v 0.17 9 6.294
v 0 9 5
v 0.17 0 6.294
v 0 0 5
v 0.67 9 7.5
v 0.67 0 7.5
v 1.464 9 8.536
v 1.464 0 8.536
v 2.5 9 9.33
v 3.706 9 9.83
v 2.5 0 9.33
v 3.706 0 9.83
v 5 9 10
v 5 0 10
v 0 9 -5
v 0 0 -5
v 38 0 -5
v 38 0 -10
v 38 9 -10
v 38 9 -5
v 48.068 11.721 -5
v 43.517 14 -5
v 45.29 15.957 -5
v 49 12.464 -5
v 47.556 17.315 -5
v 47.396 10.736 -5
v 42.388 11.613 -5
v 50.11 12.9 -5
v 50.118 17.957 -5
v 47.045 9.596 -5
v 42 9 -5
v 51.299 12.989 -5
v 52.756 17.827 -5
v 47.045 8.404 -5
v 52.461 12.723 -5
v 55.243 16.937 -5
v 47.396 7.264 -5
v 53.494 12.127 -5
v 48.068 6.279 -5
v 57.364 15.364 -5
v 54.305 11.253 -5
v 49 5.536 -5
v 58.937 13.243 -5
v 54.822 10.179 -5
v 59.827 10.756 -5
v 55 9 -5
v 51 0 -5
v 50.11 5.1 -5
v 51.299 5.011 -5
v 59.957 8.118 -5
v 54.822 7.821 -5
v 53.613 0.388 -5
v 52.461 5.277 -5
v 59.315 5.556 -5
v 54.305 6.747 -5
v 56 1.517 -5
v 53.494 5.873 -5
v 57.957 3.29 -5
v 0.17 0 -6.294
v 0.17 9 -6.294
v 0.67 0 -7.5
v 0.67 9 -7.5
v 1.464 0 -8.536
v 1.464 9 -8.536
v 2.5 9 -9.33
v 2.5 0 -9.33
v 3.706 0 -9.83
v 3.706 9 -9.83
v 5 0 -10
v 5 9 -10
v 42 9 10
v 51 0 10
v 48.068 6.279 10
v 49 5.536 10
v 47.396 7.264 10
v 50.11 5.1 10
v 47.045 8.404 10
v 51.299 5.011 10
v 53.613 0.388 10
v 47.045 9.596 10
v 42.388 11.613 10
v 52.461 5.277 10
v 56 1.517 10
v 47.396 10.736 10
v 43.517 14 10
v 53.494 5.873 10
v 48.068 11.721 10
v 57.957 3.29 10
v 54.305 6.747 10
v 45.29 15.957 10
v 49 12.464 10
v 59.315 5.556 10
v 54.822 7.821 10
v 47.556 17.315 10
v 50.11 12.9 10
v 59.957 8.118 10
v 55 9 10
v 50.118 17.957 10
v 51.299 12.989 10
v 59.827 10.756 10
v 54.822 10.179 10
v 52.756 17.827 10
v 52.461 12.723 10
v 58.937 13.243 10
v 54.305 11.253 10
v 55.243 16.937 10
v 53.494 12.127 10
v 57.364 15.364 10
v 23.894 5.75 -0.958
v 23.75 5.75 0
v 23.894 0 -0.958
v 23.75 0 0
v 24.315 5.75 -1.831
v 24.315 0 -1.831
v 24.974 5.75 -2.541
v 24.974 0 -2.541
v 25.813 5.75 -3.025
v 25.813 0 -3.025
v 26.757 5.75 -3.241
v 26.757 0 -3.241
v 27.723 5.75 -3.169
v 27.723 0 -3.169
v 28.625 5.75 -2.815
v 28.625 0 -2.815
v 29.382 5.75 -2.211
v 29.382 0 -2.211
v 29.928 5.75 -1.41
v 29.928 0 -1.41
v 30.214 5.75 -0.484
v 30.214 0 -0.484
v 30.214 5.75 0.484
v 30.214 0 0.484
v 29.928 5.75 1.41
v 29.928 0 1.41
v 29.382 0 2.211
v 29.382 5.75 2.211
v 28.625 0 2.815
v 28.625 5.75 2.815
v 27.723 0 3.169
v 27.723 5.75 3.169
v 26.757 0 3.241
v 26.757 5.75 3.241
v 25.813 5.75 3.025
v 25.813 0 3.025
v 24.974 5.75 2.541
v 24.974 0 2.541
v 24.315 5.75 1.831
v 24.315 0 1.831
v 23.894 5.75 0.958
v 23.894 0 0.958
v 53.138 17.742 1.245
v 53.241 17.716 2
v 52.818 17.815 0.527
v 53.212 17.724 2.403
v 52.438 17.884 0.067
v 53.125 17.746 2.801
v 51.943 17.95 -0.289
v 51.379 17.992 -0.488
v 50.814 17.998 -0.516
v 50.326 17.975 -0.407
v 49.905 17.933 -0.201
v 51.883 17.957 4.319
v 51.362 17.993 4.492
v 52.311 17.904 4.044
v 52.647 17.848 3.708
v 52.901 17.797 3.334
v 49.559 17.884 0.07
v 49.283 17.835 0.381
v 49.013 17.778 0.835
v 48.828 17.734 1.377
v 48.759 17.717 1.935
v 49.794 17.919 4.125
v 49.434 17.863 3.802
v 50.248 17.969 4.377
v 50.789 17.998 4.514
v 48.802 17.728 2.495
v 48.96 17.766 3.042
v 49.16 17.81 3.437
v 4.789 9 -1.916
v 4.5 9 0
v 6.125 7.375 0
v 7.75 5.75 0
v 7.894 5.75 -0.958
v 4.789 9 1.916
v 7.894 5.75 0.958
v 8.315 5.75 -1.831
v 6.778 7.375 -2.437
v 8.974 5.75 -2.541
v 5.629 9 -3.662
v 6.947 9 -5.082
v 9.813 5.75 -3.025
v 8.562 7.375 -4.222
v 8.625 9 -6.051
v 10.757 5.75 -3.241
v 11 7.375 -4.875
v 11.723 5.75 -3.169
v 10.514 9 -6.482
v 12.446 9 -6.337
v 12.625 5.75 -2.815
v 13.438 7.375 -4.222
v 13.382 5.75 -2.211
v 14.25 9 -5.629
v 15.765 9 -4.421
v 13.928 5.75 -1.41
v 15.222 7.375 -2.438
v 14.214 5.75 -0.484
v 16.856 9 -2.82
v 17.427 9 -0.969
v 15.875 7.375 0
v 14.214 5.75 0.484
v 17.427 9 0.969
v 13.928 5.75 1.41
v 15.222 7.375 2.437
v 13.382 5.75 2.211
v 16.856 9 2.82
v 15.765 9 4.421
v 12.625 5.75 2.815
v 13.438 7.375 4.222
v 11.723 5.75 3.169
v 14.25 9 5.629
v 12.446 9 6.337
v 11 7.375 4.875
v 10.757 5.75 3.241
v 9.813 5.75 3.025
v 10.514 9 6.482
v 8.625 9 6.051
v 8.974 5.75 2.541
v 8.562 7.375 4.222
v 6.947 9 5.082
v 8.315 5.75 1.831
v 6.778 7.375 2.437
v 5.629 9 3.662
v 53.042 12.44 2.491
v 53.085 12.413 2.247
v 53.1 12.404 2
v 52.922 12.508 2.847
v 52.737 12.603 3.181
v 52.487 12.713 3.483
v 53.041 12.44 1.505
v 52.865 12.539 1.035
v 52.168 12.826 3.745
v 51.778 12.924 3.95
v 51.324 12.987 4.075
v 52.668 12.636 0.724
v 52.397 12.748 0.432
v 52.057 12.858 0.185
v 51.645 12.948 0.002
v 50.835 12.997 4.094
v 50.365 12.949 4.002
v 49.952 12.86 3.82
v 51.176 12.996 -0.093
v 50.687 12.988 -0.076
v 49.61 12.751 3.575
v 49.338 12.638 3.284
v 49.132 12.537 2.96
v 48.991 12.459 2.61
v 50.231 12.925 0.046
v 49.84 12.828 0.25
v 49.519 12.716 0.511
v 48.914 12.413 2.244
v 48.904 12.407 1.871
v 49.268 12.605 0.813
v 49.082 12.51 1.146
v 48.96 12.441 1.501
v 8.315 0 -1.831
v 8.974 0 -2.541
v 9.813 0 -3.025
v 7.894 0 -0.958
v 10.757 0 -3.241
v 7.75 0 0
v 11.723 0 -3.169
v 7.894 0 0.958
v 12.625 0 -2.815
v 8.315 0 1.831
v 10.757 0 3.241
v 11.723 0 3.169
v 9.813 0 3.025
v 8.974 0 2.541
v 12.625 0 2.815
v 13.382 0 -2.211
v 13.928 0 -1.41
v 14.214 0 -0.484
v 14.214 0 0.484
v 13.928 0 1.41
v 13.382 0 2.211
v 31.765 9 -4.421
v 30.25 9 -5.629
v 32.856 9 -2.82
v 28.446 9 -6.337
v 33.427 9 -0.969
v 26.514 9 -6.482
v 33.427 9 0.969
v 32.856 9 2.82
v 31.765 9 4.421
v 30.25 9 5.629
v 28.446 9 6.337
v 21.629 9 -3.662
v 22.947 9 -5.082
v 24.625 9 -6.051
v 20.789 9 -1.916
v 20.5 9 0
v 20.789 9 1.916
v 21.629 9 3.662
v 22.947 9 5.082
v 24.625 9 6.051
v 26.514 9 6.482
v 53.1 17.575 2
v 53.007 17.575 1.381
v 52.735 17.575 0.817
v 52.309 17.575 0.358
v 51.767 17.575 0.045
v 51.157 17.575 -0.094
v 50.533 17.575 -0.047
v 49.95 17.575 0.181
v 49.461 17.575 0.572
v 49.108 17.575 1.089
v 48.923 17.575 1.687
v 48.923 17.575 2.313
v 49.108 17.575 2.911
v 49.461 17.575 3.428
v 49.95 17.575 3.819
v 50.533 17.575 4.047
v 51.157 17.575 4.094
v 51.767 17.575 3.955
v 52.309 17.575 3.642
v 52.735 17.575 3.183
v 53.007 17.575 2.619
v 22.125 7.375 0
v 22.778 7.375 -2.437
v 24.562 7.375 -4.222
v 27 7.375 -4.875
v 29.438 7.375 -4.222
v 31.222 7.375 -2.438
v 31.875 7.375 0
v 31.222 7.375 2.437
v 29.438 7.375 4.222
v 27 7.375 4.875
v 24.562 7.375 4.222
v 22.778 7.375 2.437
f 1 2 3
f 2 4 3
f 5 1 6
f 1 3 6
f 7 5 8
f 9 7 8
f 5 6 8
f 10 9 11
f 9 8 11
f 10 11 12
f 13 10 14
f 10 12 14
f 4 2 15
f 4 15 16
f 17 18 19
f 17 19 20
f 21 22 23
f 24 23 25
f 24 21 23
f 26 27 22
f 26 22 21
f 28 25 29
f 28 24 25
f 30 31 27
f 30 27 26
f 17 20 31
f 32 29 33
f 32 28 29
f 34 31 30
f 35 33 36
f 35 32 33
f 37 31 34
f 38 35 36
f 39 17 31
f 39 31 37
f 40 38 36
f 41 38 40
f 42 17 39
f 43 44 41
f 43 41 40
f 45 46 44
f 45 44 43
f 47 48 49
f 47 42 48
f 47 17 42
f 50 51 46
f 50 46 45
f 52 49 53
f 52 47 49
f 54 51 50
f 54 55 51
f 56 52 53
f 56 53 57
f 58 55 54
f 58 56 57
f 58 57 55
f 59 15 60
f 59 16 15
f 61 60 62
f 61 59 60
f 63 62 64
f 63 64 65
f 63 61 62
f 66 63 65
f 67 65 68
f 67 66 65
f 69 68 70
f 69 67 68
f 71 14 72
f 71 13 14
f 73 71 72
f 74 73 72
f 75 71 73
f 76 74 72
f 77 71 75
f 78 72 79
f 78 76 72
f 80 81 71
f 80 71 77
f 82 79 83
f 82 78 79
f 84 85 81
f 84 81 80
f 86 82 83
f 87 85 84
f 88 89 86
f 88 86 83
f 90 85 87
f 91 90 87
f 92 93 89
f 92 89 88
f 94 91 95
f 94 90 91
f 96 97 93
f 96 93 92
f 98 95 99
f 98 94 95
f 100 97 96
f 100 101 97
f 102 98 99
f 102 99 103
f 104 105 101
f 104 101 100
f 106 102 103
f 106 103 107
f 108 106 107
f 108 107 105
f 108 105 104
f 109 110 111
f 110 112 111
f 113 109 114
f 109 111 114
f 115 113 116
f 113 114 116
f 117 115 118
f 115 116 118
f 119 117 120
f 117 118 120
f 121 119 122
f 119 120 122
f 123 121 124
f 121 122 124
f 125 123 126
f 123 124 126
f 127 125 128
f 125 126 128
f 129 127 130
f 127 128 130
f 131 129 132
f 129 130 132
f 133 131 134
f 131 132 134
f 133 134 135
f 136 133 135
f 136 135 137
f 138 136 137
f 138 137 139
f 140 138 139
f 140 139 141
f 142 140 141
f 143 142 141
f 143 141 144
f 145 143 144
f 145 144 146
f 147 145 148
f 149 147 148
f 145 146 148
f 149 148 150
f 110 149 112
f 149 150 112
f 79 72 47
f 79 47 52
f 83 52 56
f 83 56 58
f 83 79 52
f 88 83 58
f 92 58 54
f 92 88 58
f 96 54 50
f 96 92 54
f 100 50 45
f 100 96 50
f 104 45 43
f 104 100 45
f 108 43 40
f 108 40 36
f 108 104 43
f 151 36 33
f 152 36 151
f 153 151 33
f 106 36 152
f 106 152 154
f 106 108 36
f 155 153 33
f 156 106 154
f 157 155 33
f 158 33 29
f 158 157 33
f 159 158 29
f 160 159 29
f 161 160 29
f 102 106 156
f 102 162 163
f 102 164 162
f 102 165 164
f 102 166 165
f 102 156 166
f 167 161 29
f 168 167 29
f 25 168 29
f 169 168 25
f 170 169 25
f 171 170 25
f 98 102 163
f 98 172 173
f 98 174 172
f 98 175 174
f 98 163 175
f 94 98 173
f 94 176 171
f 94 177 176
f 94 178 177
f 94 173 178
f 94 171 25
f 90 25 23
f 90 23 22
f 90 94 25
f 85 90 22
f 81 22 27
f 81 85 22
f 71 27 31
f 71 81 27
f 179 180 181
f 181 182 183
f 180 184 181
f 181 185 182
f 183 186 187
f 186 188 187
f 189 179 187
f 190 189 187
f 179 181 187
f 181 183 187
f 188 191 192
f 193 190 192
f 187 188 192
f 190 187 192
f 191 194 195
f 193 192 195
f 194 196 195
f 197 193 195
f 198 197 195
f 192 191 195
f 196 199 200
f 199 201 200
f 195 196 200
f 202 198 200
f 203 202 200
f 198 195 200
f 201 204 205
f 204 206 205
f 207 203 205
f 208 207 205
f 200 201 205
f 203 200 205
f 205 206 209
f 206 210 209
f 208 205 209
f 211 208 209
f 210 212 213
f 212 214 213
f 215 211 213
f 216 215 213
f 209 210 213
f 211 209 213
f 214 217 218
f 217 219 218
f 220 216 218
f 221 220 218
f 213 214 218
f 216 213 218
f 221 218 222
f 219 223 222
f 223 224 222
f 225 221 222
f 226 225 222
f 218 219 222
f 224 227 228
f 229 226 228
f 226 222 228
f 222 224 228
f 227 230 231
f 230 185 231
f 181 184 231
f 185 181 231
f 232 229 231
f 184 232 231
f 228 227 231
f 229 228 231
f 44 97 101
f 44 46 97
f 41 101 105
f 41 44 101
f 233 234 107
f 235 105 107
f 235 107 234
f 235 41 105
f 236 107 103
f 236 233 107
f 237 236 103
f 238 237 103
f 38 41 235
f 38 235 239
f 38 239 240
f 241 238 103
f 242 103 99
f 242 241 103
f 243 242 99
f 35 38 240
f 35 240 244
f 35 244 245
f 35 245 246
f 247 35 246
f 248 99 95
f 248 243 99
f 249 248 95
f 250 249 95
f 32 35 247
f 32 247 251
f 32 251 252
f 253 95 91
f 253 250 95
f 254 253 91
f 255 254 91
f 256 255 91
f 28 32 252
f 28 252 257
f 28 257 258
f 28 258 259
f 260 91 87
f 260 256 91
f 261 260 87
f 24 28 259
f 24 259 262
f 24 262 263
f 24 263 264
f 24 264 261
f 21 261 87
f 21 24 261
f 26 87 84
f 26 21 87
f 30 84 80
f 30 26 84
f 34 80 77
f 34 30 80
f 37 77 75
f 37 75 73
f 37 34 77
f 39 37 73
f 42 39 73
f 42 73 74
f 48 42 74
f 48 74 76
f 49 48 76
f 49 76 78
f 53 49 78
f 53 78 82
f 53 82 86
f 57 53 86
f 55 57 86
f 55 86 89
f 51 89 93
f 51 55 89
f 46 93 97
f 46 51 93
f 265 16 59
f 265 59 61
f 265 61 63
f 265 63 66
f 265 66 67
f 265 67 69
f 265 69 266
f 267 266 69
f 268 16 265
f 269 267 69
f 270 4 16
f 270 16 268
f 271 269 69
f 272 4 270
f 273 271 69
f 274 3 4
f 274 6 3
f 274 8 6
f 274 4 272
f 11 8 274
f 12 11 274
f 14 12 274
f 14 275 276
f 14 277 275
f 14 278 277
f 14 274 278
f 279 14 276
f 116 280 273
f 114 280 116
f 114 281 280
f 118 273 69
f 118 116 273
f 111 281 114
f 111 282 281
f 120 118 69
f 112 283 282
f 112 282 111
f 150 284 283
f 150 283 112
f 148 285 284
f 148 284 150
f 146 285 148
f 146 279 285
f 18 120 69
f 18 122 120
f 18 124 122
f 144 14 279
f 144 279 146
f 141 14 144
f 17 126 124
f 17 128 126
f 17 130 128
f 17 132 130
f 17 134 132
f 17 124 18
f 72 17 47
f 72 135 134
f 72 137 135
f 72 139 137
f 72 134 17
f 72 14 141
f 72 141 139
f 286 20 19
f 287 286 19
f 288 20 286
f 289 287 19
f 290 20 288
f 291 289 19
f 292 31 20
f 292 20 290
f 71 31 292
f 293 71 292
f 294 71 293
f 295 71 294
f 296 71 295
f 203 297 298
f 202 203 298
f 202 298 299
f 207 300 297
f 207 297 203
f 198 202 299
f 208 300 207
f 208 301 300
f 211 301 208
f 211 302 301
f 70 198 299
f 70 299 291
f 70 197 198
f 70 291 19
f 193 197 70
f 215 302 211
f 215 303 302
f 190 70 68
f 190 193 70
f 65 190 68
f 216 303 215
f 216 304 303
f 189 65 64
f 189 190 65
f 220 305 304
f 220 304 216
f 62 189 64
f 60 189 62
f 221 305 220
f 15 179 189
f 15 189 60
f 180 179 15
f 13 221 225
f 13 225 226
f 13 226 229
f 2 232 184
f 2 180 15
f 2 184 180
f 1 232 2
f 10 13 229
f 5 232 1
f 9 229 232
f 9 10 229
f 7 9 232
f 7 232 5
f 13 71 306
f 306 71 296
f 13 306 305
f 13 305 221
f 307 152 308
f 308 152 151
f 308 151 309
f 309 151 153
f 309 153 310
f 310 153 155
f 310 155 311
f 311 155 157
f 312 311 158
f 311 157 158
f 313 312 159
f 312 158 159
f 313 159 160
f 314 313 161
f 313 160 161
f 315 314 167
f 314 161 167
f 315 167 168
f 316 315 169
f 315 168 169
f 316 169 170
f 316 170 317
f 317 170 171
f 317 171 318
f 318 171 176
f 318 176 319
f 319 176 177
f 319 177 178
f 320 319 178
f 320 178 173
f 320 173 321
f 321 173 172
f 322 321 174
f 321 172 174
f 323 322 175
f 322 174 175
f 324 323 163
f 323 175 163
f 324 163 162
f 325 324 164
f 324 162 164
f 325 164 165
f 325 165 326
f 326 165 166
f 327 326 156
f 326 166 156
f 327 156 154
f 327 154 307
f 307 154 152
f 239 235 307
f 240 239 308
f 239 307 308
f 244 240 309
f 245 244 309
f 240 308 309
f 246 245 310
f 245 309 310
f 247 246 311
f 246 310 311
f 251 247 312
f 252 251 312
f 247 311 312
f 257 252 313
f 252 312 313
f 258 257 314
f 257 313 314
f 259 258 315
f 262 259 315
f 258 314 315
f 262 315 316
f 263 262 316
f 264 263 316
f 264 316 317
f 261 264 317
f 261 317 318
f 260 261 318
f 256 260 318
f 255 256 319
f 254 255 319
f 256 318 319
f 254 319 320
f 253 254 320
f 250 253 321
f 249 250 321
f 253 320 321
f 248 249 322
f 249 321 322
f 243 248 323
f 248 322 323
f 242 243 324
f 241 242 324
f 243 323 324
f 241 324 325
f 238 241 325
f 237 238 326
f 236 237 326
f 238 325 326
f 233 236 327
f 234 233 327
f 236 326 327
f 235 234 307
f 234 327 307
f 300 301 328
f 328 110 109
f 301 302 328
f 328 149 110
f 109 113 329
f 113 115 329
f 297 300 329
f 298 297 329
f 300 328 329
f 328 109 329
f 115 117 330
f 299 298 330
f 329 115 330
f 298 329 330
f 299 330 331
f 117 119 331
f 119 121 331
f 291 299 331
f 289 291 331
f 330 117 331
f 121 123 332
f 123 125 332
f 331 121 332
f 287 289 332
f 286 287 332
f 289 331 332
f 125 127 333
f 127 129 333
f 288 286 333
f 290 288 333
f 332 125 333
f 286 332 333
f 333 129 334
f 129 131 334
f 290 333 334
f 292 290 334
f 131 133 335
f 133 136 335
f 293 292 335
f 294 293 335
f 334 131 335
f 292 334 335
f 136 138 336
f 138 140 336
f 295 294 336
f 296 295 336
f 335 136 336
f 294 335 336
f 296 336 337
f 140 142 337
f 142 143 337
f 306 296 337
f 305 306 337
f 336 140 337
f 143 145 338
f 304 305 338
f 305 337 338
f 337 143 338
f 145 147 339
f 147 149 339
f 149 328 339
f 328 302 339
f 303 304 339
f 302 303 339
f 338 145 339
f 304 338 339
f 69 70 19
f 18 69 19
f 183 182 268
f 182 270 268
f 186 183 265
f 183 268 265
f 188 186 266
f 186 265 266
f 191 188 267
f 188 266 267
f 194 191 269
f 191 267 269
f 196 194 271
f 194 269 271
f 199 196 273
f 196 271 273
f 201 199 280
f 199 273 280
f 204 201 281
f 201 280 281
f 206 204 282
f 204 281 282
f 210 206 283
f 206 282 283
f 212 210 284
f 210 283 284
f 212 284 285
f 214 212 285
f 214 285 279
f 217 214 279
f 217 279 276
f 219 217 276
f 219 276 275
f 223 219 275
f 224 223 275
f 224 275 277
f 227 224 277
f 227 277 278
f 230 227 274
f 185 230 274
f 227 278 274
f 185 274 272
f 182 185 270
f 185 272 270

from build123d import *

# Parameters (mm, degrees)
SKETCH_1_R                        = 4
EXTRUDE_1_DEPTH                   = 10
CUT_EXTRUDE_1_DEPTH               = 62.489836559
CUT_EXTRUDE_1_DEPTH_BACK          = 62.489836559
HOLE_WIZARD_6_5_6_5_1_D           = 6.5
HOLE_WIZARD_6_5_6_5_1_DEPTH       = 13
HOLE_WIZARD_6_5_6_5_1_CSINK_D     = 13
HOLE_WIZARD_6_5_6_5_1_CSINK_ANGLE = 90
HOLE_WIZARD_6_5_6_5_1_TIP         = 1.952797012
FILLET_1_R                        = 5


# Read off the part's stored shape, not the designer's step: M5 螺纹孔1
with BuildPart() as part:
    # 草图1 → 凸台-拉伸1 (new, symmetric)
    with BuildSketch(Plane.XY):
        with BuildLine():
            Line((0, 0), (51, 0))
            ThreePointArc((51, 0), (57.363961031, 15.363961031), (42, 9))
            Line((42, 9), (0, 9))
            Line((0, 9), (0, 0))
        make_face()
        with Locations((51, 9)):
            Circle(SKETCH_1_R, mode=Mode.SUBTRACT)
    extrude(amount=EXTRUDE_1_DEPTH, both=True)

    # 草图2 → 切除-拉伸1 (cut, two sides: drawn at the far end of the back side and taken through both)
    with BuildSketch(Plane(origin=(0, 9, 0), x_dir=(1, 0, 0), z_dir=(0, 1, 0)).offset(-CUT_EXTRUDE_1_DEPTH_BACK)):
        Polygon((193.693168769, 5), (60, 5), (38, 5), (38, 10), (38, 143.693168769), (215.856075393, 343.349548449), (371.549244162, 204.65637968), align=None)
    extrude(amount=CUT_EXTRUDE_1_DEPTH + CUT_EXTRUDE_1_DEPTH_BACK, mode=Mode.SUBTRACT)

    # Ø6.5 (6.5) 直径孔1
    with Locations(Plane(origin=(0, 9, 0), x_dir=(1, 0, 0), z_dir=(0, 1, 0))):
        with Locations((11, 0), (27, 0)):
            CounterSinkHole(HOLE_WIZARD_6_5_6_5_1_D / 2, HOLE_WIZARD_6_5_6_5_1_CSINK_D / 2, depth=HOLE_WIZARD_6_5_6_5_1_DEPTH, counter_sink_angle=HOLE_WIZARD_6_5_6_5_1_CSINK_ANGLE)
            with Locations((0, 0, -(HOLE_WIZARD_6_5_6_5_1_DEPTH + HOLE_WIZARD_6_5_6_5_1_TIP / 2))):  # 118° drill point
                Cone(0, HOLE_WIZARD_6_5_6_5_1_D / 2, HOLE_WIZARD_6_5_6_5_1_TIP, mode=Mode.SUBTRACT)

    # M5 螺纹孔1 outline → M5 螺纹孔1 (revolve, cut)
    with BuildSketch(Plane(origin=(51, 0, 2), x_dir=(1, 0, 0), z_dir=(0, 0, 1))):
        Polygon((2.52510553, 18.00010553), (0, 18.00010553), (0, 12.404132041), (2.1, 12.404132041), (2.1, 17.575), align=None)
    revolve(axis=Axis((51, 0, 2), (0, 1, 0)), mode=Mode.SUBTRACT)

    # 圆角1
    fillet_1_edges = [part.edges().sort_by_distance(p)[0] for p in [
        (0, 4.5, 10),
        (0, 4.5, -10),
    ]]
    fillet(fillet_1_edges, radius=FILLET_1_R)


solid = part.part
